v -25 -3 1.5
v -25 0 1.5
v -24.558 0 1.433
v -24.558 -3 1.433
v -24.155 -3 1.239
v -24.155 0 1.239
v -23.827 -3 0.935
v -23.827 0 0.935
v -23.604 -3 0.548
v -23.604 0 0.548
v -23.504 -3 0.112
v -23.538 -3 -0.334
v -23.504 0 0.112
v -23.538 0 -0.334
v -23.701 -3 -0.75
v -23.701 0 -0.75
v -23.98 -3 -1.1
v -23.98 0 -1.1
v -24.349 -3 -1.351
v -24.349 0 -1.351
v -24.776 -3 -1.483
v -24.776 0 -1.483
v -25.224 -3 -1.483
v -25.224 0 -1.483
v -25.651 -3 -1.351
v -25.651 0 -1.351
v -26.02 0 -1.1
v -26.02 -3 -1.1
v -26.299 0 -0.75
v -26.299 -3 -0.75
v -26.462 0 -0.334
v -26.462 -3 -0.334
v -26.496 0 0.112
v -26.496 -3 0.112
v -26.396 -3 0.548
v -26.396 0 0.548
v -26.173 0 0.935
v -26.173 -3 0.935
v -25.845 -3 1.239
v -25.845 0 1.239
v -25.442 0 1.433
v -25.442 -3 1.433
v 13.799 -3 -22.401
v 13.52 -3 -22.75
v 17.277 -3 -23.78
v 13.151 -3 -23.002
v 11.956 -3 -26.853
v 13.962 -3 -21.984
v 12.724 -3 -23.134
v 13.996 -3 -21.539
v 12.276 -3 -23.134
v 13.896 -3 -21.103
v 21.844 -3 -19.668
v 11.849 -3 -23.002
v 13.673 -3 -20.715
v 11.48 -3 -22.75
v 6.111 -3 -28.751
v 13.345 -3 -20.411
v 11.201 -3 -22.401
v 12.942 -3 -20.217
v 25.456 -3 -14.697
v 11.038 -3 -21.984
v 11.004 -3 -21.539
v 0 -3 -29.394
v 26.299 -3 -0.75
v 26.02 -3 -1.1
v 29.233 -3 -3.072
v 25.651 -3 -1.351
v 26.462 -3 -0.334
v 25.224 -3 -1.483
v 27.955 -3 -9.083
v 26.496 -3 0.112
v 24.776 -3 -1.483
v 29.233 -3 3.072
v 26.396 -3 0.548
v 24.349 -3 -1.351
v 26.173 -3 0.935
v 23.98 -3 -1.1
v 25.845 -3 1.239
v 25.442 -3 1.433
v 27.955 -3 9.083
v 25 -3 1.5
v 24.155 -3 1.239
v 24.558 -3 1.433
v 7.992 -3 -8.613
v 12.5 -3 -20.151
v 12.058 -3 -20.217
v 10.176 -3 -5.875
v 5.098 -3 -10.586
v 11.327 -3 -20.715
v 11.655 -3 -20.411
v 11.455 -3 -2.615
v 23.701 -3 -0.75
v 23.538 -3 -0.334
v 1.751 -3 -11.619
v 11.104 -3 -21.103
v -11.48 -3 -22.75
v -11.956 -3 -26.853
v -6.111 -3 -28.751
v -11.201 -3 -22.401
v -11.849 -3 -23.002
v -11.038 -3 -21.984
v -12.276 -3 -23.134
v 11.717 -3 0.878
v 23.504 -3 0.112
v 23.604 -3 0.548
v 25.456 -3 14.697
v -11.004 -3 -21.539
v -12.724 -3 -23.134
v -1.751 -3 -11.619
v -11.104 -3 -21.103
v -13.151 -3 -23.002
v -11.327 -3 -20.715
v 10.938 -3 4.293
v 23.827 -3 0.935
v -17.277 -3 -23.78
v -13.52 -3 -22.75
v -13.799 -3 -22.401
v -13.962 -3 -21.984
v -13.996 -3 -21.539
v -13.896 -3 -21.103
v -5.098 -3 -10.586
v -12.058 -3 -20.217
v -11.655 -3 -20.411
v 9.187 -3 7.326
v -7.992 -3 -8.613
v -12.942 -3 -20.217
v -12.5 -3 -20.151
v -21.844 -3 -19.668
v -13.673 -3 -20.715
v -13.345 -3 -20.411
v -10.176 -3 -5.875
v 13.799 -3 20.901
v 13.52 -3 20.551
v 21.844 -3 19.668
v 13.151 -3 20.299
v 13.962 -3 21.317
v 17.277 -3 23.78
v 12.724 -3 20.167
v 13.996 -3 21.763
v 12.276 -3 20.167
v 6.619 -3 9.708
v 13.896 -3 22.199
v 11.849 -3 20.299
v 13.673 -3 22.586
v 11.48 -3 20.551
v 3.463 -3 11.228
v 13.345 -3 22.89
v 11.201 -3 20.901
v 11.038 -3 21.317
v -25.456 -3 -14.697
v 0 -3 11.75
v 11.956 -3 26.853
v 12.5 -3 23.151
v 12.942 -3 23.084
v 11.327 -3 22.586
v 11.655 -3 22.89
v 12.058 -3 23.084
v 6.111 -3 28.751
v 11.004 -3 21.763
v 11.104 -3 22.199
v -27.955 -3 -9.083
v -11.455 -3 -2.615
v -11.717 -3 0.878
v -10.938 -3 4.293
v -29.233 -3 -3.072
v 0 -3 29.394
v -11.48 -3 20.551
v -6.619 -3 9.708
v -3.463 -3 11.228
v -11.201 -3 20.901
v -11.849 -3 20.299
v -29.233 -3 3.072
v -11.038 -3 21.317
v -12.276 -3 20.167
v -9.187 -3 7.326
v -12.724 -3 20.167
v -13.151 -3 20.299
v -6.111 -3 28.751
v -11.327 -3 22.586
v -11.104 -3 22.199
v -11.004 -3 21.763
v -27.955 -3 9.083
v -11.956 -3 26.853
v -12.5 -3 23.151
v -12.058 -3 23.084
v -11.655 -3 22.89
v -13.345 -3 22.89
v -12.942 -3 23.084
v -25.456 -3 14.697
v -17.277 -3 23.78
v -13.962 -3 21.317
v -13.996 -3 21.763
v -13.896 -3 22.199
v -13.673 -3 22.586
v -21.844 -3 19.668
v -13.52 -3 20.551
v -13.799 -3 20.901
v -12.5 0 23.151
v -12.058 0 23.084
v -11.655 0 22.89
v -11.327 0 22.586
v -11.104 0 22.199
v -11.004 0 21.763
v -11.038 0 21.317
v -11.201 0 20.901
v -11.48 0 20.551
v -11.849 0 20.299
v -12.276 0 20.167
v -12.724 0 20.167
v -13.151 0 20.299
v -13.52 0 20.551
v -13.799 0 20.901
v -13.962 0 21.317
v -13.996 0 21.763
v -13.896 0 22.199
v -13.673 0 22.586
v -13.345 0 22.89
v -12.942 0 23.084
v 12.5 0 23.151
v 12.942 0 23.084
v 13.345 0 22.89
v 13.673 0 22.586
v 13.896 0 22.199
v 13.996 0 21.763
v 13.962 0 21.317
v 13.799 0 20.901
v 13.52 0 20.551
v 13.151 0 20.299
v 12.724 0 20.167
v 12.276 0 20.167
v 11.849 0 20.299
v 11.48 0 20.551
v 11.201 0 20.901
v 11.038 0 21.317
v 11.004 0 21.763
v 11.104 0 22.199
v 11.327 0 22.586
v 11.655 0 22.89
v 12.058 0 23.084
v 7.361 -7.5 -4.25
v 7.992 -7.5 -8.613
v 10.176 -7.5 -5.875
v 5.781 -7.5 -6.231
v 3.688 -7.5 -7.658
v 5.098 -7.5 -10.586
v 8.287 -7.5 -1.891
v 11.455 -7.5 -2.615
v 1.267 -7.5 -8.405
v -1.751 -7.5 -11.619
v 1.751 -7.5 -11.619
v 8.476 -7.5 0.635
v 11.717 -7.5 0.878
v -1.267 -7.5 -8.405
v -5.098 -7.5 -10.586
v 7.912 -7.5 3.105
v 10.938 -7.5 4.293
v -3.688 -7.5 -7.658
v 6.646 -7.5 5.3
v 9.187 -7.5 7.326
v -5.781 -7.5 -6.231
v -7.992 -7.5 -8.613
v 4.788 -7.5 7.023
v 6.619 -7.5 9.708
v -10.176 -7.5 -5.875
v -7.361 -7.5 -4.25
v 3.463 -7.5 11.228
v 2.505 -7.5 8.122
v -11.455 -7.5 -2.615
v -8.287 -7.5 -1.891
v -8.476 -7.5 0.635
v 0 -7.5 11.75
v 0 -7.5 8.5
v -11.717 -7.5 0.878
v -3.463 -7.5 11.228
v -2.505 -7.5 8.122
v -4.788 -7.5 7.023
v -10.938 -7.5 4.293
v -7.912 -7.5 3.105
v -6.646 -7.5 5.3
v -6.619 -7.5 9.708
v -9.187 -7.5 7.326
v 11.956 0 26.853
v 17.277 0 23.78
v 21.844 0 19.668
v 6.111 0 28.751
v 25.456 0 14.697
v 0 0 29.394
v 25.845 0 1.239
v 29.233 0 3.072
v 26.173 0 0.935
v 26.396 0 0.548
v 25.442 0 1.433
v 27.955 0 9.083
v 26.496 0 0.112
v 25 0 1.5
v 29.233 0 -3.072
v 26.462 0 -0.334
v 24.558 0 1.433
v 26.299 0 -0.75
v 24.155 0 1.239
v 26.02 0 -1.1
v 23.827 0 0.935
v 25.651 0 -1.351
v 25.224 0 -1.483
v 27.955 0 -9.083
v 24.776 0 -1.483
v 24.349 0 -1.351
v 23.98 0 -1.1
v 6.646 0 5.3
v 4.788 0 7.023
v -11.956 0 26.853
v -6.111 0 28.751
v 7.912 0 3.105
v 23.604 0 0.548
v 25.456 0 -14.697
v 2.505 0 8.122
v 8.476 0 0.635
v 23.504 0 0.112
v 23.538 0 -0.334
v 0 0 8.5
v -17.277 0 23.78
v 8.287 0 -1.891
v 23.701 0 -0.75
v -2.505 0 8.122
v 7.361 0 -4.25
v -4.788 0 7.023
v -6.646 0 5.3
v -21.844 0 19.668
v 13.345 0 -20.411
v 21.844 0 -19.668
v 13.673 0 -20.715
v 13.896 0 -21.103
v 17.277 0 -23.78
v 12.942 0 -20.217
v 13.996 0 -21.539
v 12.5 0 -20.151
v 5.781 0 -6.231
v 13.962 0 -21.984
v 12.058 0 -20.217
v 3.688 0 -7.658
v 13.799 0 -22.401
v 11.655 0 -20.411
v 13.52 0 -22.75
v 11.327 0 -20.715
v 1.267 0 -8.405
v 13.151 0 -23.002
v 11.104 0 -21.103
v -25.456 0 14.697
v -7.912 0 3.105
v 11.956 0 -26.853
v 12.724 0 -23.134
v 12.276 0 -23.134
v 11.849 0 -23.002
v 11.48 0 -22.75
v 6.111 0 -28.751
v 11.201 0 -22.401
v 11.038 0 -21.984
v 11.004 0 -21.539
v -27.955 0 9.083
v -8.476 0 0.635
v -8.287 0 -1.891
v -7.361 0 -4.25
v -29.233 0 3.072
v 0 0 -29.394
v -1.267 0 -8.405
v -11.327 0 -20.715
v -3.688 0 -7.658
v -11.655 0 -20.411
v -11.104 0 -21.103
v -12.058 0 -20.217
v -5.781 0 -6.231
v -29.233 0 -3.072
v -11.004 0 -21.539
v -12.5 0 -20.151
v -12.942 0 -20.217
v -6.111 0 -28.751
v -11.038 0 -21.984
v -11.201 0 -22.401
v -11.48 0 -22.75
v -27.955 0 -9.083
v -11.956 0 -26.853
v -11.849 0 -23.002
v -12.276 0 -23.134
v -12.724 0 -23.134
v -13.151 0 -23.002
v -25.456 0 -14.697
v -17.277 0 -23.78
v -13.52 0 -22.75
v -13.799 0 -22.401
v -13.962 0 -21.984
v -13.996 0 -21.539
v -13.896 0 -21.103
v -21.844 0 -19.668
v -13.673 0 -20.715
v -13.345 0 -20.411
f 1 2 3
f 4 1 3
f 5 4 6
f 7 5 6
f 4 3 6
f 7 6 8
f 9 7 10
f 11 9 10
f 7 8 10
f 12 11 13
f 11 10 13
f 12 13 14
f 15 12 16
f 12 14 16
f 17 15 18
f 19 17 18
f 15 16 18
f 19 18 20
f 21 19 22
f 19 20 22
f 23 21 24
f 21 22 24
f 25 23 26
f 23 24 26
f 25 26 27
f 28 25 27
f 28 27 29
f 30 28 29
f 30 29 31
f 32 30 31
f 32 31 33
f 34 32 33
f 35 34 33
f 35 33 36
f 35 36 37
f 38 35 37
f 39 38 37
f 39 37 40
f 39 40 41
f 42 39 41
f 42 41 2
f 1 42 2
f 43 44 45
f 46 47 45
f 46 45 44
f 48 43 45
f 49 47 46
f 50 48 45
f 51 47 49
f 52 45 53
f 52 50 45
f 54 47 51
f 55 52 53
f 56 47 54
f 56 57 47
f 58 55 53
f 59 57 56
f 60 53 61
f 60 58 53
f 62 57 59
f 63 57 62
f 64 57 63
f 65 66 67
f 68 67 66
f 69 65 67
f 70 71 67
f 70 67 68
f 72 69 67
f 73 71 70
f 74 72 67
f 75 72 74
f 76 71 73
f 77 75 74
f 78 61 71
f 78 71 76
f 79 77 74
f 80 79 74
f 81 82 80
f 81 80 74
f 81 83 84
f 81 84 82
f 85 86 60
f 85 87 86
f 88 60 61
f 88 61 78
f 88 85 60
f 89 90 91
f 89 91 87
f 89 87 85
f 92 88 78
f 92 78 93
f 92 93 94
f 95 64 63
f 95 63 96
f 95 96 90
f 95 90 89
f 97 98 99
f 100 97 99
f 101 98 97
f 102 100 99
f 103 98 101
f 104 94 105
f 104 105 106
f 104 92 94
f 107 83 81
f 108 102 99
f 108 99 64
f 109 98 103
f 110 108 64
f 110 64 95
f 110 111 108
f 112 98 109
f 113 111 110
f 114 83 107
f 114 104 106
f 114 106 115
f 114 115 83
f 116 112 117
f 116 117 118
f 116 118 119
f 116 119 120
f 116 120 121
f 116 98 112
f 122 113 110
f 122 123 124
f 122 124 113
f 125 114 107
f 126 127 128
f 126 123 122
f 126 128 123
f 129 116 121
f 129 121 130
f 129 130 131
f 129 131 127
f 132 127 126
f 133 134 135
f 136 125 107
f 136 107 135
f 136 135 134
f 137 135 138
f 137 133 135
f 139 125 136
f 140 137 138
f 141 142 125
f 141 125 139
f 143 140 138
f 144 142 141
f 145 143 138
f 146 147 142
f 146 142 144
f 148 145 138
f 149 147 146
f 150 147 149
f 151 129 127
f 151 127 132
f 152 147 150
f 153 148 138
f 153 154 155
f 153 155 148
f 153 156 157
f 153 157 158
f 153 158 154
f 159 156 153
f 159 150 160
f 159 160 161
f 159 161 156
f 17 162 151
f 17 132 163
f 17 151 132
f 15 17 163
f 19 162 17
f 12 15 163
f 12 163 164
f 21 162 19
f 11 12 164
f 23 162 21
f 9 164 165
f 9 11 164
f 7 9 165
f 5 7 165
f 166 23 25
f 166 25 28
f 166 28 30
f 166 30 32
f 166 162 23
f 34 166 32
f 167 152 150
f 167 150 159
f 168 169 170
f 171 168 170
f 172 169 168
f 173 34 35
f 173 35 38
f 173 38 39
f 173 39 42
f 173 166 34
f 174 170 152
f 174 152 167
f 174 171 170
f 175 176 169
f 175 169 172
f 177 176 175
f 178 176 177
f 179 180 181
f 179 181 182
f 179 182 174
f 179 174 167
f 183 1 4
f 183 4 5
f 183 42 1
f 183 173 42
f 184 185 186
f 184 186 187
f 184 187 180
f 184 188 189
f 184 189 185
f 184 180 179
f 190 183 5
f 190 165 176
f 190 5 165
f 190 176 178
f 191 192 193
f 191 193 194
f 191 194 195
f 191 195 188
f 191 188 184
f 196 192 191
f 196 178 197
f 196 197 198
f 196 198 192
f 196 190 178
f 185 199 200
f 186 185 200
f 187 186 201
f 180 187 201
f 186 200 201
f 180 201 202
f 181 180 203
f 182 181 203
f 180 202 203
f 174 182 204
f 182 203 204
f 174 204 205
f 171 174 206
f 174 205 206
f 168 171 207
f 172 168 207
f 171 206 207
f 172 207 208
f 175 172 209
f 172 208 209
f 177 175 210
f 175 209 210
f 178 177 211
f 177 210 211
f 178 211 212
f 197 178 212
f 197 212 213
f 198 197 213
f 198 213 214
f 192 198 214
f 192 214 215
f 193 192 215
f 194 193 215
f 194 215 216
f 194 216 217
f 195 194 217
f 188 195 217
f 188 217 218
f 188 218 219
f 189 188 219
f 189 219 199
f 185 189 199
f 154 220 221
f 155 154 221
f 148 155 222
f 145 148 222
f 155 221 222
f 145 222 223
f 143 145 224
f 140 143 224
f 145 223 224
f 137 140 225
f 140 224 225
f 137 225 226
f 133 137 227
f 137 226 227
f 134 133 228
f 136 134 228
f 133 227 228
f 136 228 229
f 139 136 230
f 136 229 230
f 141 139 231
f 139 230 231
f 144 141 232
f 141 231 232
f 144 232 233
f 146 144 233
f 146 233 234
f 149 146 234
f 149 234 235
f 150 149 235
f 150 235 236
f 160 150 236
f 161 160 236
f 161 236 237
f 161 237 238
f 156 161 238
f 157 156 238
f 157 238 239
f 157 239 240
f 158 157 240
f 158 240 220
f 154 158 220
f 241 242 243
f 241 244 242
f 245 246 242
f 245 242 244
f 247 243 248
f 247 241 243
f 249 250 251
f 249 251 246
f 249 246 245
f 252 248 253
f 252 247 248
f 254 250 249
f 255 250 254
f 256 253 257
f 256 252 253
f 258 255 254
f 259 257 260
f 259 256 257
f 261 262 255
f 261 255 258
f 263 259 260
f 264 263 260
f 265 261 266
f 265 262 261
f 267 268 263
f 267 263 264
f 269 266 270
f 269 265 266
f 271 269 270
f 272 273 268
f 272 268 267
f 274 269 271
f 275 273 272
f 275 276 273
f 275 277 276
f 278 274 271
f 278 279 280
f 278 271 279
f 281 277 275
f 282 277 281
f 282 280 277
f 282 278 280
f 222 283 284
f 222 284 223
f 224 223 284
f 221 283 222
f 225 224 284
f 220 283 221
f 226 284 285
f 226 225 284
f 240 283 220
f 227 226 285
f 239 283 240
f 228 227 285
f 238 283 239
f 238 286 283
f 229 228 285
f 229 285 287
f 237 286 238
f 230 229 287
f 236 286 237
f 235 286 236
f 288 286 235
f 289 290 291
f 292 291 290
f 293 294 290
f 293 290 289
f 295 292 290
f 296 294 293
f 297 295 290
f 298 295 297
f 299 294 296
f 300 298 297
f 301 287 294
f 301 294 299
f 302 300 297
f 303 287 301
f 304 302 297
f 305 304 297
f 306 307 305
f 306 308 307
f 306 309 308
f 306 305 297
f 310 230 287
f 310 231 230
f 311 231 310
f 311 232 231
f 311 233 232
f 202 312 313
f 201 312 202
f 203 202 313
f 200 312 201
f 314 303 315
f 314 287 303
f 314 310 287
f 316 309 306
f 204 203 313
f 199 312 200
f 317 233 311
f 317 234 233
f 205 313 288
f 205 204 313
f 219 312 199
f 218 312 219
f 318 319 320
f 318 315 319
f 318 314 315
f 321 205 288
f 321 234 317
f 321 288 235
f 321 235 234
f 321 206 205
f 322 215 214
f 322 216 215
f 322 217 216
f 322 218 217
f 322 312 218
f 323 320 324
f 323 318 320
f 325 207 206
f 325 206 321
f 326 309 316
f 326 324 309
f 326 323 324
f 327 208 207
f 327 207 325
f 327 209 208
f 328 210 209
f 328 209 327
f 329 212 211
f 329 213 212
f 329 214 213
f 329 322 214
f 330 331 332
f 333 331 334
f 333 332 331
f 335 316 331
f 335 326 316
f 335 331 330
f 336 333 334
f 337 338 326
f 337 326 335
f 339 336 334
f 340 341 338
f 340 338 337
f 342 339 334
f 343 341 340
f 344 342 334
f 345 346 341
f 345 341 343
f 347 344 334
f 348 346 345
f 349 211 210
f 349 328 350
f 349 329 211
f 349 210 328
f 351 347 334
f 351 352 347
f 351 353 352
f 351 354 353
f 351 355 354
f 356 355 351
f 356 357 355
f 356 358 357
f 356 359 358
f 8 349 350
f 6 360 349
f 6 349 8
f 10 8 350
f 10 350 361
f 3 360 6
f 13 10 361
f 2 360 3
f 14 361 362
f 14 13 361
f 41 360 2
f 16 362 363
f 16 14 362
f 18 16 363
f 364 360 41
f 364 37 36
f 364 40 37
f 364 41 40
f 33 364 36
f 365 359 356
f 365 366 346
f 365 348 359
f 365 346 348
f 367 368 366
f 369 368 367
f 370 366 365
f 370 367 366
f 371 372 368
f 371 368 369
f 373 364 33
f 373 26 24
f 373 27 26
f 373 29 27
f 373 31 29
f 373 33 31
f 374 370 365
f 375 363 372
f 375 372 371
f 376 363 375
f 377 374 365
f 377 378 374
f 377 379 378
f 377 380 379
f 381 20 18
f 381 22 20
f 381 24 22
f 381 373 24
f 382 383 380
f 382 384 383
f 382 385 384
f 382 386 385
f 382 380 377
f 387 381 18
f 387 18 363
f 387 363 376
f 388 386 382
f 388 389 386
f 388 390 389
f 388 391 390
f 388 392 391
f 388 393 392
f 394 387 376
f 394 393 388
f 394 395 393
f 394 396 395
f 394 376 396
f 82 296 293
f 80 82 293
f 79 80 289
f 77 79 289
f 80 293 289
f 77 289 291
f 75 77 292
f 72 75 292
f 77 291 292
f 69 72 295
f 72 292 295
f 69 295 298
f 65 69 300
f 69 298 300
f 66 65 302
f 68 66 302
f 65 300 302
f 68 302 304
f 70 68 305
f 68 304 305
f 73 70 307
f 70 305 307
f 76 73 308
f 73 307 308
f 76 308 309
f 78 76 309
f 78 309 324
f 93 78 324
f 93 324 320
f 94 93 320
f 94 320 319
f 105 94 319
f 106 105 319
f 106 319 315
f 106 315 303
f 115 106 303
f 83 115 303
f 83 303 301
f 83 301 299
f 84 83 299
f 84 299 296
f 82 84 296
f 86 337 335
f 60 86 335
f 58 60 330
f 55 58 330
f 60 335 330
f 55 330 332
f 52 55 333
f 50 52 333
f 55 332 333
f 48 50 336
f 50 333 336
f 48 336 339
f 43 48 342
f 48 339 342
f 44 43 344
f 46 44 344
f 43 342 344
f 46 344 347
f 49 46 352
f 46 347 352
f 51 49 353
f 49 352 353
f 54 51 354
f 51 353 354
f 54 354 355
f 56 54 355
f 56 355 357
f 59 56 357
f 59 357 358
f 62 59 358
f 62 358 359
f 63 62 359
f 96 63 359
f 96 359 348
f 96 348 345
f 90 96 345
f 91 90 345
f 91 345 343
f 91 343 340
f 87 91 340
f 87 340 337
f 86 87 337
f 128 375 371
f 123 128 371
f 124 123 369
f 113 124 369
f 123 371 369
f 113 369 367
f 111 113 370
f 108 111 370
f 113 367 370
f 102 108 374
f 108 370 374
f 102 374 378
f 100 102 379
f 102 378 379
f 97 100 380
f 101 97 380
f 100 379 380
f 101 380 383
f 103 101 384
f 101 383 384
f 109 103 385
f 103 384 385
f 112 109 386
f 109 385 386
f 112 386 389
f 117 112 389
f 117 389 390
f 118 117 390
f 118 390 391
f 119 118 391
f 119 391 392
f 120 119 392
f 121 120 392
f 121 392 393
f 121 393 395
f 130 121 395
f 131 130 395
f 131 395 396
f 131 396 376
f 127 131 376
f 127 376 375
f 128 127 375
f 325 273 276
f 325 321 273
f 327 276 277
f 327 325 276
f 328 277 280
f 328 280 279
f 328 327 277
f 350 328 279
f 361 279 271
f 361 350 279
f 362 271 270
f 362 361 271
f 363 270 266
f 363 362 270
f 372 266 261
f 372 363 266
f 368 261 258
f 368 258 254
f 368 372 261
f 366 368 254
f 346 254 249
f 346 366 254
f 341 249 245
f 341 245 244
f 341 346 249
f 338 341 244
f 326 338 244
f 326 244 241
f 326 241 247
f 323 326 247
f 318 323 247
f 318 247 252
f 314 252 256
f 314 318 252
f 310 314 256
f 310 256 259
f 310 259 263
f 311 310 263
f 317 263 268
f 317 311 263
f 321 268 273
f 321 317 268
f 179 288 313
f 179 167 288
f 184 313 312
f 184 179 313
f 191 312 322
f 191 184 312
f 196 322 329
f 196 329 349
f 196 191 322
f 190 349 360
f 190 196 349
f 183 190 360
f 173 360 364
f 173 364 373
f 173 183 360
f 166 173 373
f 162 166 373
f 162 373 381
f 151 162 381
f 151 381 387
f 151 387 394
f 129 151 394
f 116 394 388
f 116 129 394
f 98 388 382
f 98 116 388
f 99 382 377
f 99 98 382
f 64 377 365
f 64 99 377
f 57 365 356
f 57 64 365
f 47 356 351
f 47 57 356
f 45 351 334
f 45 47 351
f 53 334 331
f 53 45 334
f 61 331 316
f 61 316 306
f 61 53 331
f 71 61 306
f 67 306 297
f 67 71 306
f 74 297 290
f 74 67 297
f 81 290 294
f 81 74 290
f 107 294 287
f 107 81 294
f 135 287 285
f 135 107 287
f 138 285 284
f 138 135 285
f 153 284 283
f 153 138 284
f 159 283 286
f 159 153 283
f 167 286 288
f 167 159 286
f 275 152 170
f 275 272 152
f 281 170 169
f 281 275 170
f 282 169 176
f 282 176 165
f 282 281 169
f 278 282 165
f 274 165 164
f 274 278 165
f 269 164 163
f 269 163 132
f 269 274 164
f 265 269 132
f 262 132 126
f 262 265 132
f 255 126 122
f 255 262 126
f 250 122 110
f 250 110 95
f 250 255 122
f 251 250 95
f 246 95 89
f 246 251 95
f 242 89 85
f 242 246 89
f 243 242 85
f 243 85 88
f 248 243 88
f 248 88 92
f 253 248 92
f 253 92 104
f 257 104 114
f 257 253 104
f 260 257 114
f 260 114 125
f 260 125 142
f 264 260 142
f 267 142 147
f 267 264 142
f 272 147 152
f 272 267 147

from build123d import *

# Parameters (mm, degrees)
SKETCH5_R          = 1.5
CUT_EXTRUDE1_DEPTH = 43.24020689


with BuildPart() as part:
    # Sketch4 → Revolve1 (revolve)
    with BuildSketch(Plane.XY, mode=Mode.PRIVATE) as revolve1_sk:
        Polygon((-8.5, 0), (-29.39375, 0), (-29.39375, -3), (-11.75, -3), (-11.75, -7.5), (-8.5, -7.5), align=None)
    revolve(revolve1_sk.sketch.rotate(Axis((0, 27.279243053, 0), (0, -1, 0)), 270), axis=Axis((0, 27.279243053, 0), (0, -1, 0)))

    # Sketch5 → Cut-Extrude1 (cut, through all)
    with BuildSketch(Plane(origin=(0, 0, 0), x_dir=(1, 0, 0), z_dir=(0, 1, 0))):
        with Locations(Location((-25, 0, 0), (0, 0, 270))):
            Circle(SKETCH5_R)
        with Locations(Location((-12.5, 21.650635095, 0), (0, 0, 270))):
            Circle(SKETCH5_R)
        with Locations(Location((12.5, 21.650635095, 0), (0, 0, 270))):
            Circle(SKETCH5_R)
        with Locations(Location((25, 0, 0), (0, 0, 270))):
            Circle(SKETCH5_R)
        with Locations(Location((12.5, -21.650635095, 0), (0, 0, 270))):
            Circle(SKETCH5_R)
        with Locations(Location((-12.5, -21.650635095, 0), (0, 0, 270))):
            Circle(SKETCH5_R)
    extrude(amount=-CUT_EXTRUDE1_DEPTH, mode=Mode.SUBTRACT)


solid = part.part
